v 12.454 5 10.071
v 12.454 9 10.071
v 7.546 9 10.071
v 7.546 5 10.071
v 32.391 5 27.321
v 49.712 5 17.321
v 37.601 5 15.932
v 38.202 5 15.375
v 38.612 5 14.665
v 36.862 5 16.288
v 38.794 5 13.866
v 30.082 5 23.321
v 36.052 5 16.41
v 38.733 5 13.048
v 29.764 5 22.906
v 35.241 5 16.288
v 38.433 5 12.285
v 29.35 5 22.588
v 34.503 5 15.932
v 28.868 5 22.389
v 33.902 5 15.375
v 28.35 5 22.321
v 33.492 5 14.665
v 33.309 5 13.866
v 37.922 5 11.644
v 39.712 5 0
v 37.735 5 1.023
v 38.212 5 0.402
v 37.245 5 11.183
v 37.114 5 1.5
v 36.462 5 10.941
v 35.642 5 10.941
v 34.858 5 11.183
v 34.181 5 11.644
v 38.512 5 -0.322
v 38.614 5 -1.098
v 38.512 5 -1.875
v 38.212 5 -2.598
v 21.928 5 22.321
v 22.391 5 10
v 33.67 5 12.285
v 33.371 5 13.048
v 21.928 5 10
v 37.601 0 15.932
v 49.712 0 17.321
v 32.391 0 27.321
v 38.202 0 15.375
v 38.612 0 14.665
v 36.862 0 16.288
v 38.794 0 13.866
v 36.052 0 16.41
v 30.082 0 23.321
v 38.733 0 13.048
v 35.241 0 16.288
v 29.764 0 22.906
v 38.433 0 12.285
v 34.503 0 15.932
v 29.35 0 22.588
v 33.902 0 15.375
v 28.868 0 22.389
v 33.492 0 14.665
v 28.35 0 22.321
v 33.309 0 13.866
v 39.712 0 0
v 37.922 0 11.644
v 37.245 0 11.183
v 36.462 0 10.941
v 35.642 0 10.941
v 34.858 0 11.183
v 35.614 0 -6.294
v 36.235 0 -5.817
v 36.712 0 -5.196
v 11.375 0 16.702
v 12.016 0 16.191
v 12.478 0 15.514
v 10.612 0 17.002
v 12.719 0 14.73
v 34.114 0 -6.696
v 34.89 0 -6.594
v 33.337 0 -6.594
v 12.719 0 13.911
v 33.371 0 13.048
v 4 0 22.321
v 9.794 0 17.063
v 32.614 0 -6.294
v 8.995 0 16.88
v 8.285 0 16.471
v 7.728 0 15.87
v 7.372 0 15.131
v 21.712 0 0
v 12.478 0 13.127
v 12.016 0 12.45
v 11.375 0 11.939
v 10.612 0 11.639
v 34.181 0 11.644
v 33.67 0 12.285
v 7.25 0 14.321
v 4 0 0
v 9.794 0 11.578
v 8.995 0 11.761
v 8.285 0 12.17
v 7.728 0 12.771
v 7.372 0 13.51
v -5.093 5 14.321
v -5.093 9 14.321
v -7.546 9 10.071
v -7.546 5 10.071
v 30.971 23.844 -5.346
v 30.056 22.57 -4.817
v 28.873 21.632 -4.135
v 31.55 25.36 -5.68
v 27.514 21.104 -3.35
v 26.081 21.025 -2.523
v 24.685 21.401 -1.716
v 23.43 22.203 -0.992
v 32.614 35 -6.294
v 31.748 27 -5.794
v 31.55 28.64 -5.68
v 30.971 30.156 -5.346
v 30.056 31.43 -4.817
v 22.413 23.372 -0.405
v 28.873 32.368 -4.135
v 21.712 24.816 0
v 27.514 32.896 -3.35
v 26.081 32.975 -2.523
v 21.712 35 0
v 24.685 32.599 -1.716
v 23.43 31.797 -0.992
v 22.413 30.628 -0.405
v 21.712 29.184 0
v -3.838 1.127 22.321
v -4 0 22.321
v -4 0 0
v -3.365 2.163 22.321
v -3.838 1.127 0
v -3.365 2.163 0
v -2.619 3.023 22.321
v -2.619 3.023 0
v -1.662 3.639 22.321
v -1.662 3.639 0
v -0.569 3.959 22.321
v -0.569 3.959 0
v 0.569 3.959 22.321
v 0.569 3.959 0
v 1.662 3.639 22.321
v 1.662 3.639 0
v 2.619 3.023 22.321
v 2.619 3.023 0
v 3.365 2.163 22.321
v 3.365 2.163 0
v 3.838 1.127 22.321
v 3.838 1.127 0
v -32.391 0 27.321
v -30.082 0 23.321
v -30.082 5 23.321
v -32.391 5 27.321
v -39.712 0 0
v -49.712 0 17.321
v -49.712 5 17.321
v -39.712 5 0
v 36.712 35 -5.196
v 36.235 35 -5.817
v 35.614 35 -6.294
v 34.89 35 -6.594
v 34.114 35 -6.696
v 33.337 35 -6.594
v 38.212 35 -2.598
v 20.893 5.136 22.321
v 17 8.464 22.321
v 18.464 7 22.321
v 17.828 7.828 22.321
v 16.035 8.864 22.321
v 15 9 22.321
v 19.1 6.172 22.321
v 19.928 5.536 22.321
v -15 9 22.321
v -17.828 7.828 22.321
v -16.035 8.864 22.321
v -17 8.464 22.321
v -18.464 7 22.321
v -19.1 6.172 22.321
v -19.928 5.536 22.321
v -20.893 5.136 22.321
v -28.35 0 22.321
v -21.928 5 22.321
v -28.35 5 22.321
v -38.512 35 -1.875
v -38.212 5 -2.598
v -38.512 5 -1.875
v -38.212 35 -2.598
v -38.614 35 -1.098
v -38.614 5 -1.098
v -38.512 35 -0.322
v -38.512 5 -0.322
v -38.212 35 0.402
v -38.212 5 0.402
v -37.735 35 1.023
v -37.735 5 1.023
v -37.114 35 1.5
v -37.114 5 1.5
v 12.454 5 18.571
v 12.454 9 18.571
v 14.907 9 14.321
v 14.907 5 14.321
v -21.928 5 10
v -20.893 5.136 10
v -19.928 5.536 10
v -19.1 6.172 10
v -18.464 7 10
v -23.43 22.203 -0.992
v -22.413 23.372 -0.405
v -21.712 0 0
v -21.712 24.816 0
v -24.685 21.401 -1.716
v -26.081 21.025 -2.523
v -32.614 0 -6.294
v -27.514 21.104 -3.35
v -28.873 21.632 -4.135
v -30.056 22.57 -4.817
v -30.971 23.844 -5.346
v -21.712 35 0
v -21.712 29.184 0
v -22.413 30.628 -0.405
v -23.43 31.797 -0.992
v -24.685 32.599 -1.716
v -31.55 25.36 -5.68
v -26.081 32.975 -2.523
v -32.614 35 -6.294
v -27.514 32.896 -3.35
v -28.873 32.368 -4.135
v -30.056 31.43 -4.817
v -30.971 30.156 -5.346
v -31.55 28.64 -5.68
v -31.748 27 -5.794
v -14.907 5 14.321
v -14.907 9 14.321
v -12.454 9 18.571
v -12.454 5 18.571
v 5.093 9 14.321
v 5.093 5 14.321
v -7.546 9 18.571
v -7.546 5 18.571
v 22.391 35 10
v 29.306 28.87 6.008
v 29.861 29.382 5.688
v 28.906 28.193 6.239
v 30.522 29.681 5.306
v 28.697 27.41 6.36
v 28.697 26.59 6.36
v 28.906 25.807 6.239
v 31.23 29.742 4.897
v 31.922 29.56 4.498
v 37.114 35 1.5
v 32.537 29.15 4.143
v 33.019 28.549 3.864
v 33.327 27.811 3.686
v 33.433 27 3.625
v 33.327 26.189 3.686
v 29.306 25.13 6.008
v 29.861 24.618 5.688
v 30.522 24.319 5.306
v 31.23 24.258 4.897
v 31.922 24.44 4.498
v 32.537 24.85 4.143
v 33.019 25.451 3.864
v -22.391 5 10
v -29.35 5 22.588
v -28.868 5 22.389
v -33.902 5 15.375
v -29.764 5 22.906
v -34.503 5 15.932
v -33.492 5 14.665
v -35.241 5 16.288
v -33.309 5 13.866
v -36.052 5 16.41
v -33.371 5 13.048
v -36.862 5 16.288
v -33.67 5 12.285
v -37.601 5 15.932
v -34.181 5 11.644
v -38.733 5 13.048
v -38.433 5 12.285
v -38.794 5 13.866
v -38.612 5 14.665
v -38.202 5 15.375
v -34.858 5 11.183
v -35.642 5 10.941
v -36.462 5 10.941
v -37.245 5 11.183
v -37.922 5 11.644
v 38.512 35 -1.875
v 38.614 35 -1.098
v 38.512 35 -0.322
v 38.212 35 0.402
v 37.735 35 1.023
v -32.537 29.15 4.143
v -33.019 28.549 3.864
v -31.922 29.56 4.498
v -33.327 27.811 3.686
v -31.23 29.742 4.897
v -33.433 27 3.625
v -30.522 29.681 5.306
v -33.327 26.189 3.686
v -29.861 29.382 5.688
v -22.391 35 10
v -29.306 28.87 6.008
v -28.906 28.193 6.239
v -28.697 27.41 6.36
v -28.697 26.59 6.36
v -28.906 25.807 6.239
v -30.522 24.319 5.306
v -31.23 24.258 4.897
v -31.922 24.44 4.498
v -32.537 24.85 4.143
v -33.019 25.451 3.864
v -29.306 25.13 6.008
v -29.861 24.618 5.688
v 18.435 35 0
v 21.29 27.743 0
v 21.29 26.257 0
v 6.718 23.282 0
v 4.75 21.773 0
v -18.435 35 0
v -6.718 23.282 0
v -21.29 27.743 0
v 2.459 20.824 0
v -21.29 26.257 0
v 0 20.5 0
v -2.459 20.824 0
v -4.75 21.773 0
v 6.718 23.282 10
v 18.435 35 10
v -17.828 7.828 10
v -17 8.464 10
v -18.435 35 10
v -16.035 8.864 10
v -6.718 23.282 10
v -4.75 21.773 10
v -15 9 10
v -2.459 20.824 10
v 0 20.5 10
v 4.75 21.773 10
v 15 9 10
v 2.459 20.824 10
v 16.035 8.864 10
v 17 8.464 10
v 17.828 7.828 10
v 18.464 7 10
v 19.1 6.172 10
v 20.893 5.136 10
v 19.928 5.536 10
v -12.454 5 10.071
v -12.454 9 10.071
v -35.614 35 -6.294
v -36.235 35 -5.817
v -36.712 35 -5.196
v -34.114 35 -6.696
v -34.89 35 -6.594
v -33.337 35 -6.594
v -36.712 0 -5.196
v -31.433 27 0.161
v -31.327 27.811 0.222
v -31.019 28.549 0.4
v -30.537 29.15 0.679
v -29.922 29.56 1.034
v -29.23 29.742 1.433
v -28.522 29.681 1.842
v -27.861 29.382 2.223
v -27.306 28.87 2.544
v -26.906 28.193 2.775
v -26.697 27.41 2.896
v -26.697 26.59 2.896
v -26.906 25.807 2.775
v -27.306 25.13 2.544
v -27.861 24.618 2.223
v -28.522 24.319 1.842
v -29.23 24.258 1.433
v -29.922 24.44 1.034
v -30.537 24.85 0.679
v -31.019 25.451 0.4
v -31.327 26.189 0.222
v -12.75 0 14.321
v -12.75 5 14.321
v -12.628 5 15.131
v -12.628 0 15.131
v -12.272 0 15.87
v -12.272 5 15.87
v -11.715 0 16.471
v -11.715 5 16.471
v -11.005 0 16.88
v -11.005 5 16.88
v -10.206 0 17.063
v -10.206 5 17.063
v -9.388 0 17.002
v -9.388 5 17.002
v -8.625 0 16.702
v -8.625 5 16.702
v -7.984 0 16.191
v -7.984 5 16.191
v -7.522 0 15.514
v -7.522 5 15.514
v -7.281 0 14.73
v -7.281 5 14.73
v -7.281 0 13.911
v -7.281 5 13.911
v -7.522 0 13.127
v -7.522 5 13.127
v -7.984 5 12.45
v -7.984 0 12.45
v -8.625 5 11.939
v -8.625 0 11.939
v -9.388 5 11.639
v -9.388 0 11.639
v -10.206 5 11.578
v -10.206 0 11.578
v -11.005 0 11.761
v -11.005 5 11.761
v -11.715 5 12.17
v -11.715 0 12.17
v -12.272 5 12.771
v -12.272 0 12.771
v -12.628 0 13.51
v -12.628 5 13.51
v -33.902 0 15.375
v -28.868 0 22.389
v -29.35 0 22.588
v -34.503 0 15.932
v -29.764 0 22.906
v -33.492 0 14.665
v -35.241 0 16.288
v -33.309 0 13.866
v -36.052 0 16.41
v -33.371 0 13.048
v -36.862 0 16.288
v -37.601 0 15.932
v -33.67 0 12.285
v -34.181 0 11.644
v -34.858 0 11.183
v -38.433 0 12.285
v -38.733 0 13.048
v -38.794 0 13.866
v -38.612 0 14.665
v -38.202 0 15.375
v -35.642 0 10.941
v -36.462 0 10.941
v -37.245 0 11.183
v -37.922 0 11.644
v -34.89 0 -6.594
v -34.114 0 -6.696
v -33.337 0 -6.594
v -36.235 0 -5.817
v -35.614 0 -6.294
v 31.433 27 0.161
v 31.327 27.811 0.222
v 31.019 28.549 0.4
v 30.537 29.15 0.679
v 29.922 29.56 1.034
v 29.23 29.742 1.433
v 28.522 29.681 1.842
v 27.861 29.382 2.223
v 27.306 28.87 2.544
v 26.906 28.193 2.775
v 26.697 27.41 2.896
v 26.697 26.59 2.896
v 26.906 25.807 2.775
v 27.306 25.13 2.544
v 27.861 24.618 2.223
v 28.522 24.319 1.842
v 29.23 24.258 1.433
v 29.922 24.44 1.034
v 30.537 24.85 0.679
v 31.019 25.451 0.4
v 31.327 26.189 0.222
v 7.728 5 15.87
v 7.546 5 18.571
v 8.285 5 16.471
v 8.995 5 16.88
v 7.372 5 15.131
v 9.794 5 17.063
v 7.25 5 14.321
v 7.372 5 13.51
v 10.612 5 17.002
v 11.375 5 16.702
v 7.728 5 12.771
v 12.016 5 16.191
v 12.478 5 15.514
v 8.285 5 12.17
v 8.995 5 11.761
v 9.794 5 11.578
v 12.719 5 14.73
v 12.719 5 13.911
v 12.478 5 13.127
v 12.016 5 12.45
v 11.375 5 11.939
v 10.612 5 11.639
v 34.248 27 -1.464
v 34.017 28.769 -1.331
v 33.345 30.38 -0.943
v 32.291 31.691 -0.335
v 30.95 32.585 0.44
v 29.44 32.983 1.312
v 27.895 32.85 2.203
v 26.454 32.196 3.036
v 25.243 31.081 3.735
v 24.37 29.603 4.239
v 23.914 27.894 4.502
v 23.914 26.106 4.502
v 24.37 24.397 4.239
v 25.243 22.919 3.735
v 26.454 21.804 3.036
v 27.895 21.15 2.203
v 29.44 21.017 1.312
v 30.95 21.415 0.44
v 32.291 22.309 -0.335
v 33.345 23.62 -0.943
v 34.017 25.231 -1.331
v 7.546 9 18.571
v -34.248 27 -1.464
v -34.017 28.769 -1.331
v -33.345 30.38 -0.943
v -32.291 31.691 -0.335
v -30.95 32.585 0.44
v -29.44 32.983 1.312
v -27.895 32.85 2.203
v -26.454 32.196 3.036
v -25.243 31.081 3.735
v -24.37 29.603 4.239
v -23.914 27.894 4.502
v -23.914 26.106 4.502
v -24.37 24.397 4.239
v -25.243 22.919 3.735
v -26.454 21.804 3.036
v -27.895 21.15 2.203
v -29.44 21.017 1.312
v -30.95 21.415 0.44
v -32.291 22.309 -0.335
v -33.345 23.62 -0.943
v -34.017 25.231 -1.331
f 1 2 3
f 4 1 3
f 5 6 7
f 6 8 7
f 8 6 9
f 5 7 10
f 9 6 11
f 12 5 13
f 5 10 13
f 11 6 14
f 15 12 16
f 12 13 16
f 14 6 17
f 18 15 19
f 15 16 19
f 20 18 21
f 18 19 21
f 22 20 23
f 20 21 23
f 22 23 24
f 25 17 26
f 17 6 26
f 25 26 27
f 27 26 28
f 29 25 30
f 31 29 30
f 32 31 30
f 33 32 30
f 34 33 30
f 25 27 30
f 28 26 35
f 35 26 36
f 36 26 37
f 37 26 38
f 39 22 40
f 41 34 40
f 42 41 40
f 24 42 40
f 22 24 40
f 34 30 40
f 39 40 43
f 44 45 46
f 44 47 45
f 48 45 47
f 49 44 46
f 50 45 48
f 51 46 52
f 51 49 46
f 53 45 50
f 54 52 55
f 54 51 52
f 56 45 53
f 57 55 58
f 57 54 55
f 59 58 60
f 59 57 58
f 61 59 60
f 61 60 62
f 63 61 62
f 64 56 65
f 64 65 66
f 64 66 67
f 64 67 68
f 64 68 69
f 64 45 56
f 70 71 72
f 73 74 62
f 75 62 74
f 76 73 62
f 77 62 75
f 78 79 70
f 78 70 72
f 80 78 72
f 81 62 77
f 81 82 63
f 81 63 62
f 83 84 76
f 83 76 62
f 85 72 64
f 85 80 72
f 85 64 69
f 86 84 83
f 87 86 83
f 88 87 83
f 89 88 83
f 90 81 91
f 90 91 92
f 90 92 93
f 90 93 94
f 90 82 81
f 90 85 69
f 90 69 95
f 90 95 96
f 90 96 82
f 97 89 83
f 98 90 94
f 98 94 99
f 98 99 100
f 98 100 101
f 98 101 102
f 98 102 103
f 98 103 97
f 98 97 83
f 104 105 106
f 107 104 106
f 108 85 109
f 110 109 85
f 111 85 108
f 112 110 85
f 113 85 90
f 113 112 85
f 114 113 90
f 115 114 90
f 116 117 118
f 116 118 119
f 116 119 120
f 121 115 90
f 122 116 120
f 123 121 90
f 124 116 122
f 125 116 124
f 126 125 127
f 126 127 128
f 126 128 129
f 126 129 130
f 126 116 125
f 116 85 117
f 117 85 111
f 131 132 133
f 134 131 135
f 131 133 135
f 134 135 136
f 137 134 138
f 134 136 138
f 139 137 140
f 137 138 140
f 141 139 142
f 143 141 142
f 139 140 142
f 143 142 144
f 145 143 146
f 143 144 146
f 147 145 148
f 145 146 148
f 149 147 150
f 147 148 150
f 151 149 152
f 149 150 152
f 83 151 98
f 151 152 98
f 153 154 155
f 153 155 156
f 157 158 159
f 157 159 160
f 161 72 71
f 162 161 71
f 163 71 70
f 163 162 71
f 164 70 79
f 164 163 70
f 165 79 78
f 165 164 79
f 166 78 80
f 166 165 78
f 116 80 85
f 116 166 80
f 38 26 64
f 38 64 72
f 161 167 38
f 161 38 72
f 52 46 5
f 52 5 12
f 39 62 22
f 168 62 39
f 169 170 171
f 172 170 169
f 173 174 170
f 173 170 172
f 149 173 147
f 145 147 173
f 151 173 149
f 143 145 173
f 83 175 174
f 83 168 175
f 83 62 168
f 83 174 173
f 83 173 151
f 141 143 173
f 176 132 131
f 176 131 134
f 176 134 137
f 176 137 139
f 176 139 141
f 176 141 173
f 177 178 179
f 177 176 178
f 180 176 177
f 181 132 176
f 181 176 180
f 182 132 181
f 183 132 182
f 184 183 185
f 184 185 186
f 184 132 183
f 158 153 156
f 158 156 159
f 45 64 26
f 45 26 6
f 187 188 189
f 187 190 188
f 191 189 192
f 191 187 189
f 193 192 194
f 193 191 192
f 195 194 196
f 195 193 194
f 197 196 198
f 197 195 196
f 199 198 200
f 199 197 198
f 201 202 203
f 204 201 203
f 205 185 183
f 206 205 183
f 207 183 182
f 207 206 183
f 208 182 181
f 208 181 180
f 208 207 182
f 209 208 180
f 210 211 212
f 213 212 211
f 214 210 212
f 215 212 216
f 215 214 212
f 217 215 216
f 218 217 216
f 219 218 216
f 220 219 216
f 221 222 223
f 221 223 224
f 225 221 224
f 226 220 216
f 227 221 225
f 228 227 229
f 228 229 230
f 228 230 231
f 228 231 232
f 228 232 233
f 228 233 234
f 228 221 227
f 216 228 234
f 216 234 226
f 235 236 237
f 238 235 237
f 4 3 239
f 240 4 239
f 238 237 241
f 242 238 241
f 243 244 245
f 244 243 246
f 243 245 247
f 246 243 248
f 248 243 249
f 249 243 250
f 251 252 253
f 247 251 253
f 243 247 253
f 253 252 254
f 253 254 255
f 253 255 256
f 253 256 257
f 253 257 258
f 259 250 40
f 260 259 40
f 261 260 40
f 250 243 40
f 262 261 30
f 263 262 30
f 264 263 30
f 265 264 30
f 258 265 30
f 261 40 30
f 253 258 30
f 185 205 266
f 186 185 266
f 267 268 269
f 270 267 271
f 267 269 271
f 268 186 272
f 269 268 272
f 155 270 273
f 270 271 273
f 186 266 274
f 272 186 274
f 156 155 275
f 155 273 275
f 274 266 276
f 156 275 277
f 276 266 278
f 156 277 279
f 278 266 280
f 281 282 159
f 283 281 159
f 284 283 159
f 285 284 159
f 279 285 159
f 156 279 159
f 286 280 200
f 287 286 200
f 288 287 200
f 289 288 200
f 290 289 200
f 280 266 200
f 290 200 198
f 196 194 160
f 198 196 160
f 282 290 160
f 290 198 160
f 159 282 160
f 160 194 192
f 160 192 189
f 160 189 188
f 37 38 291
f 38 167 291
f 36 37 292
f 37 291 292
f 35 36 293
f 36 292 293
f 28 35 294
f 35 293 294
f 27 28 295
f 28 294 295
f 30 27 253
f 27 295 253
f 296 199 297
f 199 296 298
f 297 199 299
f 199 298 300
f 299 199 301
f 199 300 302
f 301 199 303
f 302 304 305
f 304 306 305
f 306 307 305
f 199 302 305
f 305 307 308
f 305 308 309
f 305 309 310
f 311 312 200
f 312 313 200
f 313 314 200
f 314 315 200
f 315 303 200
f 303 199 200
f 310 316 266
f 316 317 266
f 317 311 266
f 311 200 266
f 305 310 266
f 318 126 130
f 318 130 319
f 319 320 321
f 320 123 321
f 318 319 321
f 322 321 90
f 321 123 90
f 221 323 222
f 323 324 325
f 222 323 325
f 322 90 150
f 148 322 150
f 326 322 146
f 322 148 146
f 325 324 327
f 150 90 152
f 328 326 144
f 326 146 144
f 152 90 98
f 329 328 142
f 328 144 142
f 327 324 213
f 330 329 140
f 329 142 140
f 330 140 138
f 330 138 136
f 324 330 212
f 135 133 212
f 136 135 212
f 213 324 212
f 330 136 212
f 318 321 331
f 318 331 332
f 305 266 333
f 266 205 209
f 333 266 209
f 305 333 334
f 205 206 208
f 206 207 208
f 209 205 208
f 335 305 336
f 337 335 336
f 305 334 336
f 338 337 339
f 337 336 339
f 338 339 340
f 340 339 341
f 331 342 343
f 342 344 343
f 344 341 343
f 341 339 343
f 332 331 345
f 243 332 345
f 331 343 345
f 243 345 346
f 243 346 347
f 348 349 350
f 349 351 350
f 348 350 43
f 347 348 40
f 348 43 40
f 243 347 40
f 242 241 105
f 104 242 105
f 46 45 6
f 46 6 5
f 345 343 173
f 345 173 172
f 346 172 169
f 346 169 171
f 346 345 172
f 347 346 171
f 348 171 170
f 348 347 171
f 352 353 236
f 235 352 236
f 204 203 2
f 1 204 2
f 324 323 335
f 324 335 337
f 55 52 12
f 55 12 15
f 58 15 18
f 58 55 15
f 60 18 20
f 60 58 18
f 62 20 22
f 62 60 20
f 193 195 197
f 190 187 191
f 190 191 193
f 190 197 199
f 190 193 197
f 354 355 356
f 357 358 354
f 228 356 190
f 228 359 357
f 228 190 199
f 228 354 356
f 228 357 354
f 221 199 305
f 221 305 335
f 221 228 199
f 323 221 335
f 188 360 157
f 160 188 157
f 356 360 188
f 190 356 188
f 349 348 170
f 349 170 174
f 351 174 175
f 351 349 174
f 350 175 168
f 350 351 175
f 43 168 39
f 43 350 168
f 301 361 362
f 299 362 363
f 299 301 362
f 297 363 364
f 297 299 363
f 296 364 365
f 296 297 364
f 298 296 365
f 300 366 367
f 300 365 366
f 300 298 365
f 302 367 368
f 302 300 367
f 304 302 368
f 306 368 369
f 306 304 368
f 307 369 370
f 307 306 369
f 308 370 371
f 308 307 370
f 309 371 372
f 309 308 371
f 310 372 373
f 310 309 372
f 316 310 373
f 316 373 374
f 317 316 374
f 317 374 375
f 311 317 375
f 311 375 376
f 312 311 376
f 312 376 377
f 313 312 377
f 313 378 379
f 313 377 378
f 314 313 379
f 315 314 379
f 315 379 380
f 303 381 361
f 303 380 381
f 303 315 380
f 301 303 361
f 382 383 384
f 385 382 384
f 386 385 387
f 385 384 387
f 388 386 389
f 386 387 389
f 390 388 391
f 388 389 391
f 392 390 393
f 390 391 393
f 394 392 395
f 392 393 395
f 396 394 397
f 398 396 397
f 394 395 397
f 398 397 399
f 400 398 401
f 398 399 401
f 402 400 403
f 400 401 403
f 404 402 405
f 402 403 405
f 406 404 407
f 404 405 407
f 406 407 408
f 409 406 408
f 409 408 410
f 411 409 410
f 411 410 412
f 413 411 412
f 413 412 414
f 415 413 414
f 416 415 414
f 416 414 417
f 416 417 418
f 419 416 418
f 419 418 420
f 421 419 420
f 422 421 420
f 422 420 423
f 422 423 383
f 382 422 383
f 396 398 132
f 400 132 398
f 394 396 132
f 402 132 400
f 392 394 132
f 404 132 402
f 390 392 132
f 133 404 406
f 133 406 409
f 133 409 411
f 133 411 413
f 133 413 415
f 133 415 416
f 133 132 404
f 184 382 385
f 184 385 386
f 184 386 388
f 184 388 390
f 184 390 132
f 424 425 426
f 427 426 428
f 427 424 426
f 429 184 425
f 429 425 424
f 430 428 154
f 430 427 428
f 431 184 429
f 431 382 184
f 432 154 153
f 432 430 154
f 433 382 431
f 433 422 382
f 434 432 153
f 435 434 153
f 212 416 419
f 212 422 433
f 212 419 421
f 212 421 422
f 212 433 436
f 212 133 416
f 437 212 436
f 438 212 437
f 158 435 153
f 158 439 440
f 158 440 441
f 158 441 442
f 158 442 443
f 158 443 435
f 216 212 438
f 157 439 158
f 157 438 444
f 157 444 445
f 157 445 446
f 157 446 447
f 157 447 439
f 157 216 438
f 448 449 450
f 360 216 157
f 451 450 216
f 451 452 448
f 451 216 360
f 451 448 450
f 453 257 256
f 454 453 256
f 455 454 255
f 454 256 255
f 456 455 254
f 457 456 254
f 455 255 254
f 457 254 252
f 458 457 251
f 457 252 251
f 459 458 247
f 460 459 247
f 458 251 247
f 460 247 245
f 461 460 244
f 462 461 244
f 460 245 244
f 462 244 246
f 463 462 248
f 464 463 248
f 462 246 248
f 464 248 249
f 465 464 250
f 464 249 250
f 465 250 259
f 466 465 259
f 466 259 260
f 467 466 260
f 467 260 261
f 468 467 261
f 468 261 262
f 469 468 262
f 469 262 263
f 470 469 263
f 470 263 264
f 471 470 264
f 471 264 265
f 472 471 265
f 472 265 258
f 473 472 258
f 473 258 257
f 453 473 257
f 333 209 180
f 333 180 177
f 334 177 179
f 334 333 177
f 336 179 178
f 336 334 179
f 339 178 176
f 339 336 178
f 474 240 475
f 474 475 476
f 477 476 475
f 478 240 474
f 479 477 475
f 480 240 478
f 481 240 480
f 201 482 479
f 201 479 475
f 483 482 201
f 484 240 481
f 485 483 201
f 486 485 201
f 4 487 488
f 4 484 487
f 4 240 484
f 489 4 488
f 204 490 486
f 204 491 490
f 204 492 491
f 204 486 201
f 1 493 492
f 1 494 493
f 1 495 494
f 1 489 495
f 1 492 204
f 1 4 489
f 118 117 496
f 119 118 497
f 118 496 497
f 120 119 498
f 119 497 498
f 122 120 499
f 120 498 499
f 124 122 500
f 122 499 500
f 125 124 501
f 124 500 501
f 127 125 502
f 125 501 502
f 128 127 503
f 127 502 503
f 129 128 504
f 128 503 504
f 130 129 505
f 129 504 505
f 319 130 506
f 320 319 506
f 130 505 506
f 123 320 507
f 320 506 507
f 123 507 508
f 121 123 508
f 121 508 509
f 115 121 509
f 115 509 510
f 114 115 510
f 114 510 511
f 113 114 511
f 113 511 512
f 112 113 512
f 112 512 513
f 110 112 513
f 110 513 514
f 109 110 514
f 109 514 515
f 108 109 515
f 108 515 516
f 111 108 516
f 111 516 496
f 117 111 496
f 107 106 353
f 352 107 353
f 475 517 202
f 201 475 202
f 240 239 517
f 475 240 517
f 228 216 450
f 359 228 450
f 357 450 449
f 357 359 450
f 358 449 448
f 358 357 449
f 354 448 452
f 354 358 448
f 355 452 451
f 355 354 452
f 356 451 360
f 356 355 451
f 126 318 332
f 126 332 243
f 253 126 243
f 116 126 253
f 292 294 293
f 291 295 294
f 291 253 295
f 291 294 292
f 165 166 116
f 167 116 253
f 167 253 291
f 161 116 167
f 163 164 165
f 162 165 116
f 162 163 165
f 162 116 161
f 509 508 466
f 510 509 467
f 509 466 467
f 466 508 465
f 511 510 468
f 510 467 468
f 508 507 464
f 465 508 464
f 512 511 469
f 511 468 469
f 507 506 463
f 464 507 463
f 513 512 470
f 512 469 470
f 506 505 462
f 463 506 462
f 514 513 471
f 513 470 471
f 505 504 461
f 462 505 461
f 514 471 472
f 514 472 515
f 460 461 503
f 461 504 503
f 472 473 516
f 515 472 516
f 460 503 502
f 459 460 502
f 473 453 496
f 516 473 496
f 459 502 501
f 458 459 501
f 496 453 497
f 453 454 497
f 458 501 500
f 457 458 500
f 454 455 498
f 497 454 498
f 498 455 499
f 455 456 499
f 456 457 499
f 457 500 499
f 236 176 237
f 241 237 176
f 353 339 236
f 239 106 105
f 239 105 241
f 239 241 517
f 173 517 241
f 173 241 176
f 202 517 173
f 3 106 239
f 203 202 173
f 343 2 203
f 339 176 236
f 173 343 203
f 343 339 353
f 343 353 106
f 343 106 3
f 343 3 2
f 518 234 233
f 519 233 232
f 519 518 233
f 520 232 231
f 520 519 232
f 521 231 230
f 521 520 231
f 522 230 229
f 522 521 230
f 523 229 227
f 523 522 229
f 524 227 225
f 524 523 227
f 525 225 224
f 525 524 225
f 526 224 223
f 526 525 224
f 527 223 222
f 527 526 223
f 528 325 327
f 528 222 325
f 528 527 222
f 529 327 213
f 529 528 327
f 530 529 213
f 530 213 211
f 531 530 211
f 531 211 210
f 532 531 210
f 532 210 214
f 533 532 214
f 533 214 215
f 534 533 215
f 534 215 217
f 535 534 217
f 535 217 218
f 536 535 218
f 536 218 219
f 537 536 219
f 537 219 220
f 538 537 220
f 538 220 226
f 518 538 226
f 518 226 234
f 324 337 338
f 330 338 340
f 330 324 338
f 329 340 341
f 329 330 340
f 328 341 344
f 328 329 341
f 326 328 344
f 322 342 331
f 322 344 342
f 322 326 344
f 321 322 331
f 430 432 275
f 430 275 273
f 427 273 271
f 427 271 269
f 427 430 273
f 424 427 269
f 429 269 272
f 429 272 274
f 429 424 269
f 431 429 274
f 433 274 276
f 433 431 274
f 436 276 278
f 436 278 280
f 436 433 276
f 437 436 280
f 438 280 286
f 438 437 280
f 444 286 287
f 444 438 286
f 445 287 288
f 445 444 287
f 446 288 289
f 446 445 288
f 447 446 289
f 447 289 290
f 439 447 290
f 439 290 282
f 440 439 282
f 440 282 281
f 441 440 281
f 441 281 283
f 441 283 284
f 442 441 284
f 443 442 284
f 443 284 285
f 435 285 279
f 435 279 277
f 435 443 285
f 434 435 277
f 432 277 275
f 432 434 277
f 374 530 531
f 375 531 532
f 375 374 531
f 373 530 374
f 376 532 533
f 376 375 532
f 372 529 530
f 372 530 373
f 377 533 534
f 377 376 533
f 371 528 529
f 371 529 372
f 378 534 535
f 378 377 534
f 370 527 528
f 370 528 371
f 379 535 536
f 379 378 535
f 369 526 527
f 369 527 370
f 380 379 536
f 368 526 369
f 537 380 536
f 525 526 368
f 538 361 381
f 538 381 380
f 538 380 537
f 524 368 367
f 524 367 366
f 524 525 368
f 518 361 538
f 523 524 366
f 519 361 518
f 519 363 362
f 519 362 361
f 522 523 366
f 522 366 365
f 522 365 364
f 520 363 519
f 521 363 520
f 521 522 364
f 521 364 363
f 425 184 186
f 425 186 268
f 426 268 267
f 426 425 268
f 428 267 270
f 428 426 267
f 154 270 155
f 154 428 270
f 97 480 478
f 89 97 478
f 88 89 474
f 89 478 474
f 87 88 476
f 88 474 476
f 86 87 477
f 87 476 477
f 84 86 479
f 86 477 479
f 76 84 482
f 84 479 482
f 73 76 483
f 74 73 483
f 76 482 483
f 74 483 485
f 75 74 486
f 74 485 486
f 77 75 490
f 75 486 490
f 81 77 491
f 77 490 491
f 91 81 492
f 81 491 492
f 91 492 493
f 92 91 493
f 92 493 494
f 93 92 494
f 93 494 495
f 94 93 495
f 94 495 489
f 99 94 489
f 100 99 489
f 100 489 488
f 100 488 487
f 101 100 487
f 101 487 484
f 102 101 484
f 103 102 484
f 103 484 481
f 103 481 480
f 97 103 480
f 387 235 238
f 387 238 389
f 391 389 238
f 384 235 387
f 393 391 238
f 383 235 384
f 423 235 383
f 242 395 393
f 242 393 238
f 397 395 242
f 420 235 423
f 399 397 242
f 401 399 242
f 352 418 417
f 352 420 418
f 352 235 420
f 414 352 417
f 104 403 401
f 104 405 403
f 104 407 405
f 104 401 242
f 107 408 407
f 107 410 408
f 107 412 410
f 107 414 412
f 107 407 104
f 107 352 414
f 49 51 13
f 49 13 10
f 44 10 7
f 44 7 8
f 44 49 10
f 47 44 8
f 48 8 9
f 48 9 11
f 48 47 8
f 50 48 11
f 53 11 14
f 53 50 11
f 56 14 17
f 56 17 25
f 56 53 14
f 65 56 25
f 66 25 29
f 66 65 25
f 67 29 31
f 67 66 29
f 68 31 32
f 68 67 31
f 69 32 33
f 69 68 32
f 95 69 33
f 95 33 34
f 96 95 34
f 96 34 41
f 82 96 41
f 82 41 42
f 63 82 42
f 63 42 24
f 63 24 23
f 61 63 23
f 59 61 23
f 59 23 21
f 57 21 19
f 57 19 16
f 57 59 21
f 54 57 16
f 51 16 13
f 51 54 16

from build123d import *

# Parameters (mm, degrees)
SKETCH1_R                = 2.75
BOSS_EXTRUDE1_DEPTH      = 5
BOSS_EXTRUDE2_DEPTH      = 30
BOSS_EXTRUDE2_DEPTH_BACK = 5
BOSS_EXTRUDE3_DEPTH      = 12.320508
SKETCH5_R                = 4
CUT_EXTRUDE1_DEPTH       = 28.320508076
SKETCH7_R                = 2.75
CUT_EXTRUDE3_DEPTH       = 51.510942144
CUT_EXTRUDE4_START       = -4
SKETCH8_R                = 6
CUT_EXTRUDE4_DEPTH       = 47.510942144
SKETCH9_R                = 2.75
CUT_EXTRUDE5_DEPTH       = 10
CUT_EXTRUDE6_DEPTH       = 4
FILLET2_R                = 3


with BuildPart() as part:
    # Sketch1 → Boss-Extrude1 (new body)
    with BuildSketch(Plane(origin=(0, 0, 0), x_dir=(1, 0, 0), z_dir=(0, 1, 0))):
        with BuildLine():
            Line((-39.711904038, 0), (39.711904038, 0))
            Line((39.711904038, 0), (49.711904038, -17.320508076))
            Line((49.711904038, -17.320508076), (32.391395962, -27.320508076))
            Line((32.391395962, -27.320508076), (30.081994885, -23.320508076))
            ThreePointArc((30.081994885, -23.320508076), (29.349944078, -22.588457268), (28.349944078, -22.320508076))
            Line((28.349944078, -22.320508076), (-28.349944078, -22.320508076))
            ThreePointArc((-28.349944078, -22.320508076), (-29.349944078, -22.588457268), (-30.081994885, -23.320508076))
            Line((-30.081994885, -23.320508076), (-32.391395962, -27.320508076))
            Line((-32.391395962, -27.320508076), (-49.711904038, -17.320508076))
            Line((-49.711904038, -17.320508076), (-39.711904038, 0))
        make_face()
        with Locations(Location((-36.05165, -13.660254038, 0), (0, 0, 270))):  # turned: the seam where the file's is
            Circle(SKETCH1_R, mode=Mode.SUBTRACT)
        with Locations(Location((36.05165, -13.660254038, 0), (0, 0, 270))):  # turned: the seam where the file's is
            Circle(SKETCH1_R, mode=Mode.SUBTRACT)
    extrude(amount=BOSS_EXTRUDE1_DEPTH)

    # Sketch2 → Boss-Extrude2 (add, two sides)
    with BuildSketch(Plane(origin=(0, 5, 0), x_dir=(1, 0, 0), z_dir=(0, 1, 0))) as boss_extrude2_sk:
        with BuildLine():
            Line((-39.711904038, 0), (-22.391395962, -10))
            Line((-22.391395962, -10), (22.391395962, -10))
            Line((22.391395962, -10), (39.711904038, 0))
            Line((39.711904038, 0), (36.711904038, 5.196152423))
            ThreePointArc((36.711904038, 5.196152423), (34.890284962, 6.593929902), (32.613827826, 6.294228634))
            Line((32.613827826, 6.294228634), (21.711904038, 0))
            Line((21.711904038, 0), (-21.711904038, 0))
            Line((-21.711904038, 0), (-32.613827826, 6.294228634))
            ThreePointArc((-32.613827826, 6.294228634), (-34.890284962, 6.593929902), (-36.711904038, 5.196152423))
            Line((-36.711904038, 5.196152423), (-39.711904038, 0))
        make_face()
    extrude(amount=BOSS_EXTRUDE2_DEPTH)
    extrude(boss_extrude2_sk.sketch, amount=-BOSS_EXTRUDE2_DEPTH_BACK)

    # Sketch4 → Boss-Extrude3 (add)
    with BuildSketch(Plane.XY.offset(10)):
        with BuildLine():
            Line((-15, 9), (15, 9))
            ThreePointArc((15, 9), (17, 8.464101615), (18.464101615, 7))
            ThreePointArc((18.464101615, 7), (19.92820323, 5.535898385), (21.92820323, 5))
            Line((21.92820323, 5), (-21.92820323, 5))
            ThreePointArc((-21.92820323, 5), (-19.92820323, 5.535898385), (-18.464101615, 7))
            ThreePointArc((-18.464101615, 7), (-17, 8.464101615), (-15, 9))
        make_face()
    extrude(amount=BOSS_EXTRUDE3_DEPTH)

    # Sketch5 → Cut-Extrude1 (cut, through all)
    with BuildSketch(Plane(origin=(0, 0, 0), x_dir=(-1, 0, 0), z_dir=(0, 0, -1))):
        Circle(SKETCH5_R)
        with BuildLine():
            Line((-6.717514421, 23.282485579), (-18.435028843, 35))
            Line((-18.435028843, 35), (18.435028843, 35))
            Line((18.435028843, 35), (6.717514421, 23.282485579))
            ThreePointArc((6.717514421, 23.282485579), (0, 20.5), (-6.717514421, 23.282485579))
        make_face()
    extrude(amount=-CUT_EXTRUDE1_DEPTH, mode=Mode.SUBTRACT)

    # Sketch7 → Cut-Extrude3 (cut, through all)
    with BuildSketch(Plane(origin=(9.927976009, 0, 17.195758865), x_dir=(0.866025404, 0, -0.5), z_dir=(0.5, 0, 0.866025404))):
        with Locations((24.391517729, 27)):
            Circle(SKETCH7_R)
    cut_extrude3 = extrude(amount=-CUT_EXTRUDE3_DEPTH, mode=Mode.SUBTRACT)

    # Sketch8 → Cut-Extrude4 (cut, through all)
    with BuildSketch(Plane(origin=(9.927976009, 0, 17.195758865), x_dir=(0.866025404, 0, -0.5), z_dir=(0.5, 0, 0.866025404)).offset(CUT_EXTRUDE4_START)):
        with Locations((24.391517729, 27)):
            Circle(SKETCH8_R)
    cut_extrude4 = extrude(amount=-CUT_EXTRUDE4_DEPTH, mode=Mode.SUBTRACT)

    # Mirror1: Cut-Extrude3, Cut-Extrude4 across plane
    add(cut_extrude3.mirror(Plane(origin=(0, 0, 0), x_dir=(0, 0, 1), z_dir=(1, 0, 0))), mode=Mode.SUBTRACT)
    add(cut_extrude4.mirror(Plane(origin=(0, 0, 0), x_dir=(0, 0, 1), z_dir=(1, 0, 0))), mode=Mode.SUBTRACT)

    # Sketch9 → Cut-Extrude5 (cut, through all)
    with BuildSketch(Plane(origin=(0, 9, 0), x_dir=(1, 0, 0), z_dir=(0, 1, 0))):
        with Locations(Location((-10, -14.32050808, 0), (0, 0, 180))):  # turned: the seam where the file's is
            Circle(SKETCH9_R)
        with Locations(Location((10, -14.32050808, 0), (0, 0, 180))):  # turned: the seam where the file's is
            Circle(SKETCH9_R)
    extrude(amount=-CUT_EXTRUDE5_DEPTH, mode=Mode.SUBTRACT)

    # Sketch10 → Cut-Extrude6 (cut)
    with BuildSketch(Plane(origin=(0, 9, 0), x_dir=(1, 0, 0), z_dir=(0, 1, 0))):
        Polygon((-5.092522712, -14.32050808), (-7.546261356, -10.07050808), (-12.453738644, -10.07050808), (-14.907477288, -14.32050808), (-12.453738644, -18.57050808), (-7.546261356, -18.57050808), align=None)
        Polygon((5.092522712, -14.32050808), (7.546261356, -18.57050808), (12.453738644, -18.57050808), (14.907477288, -14.32050808), (12.453738644, -10.07050808), (7.546261356, -10.07050808), align=None)
    extrude(amount=-CUT_EXTRUDE6_DEPTH, mode=Mode.SUBTRACT)

    # Fillet2
    fillet2_edges = [part.edges().sort_by_distance(p)[0] for p in [
        (39.711904038, 20, 0),
        (-39.711904038, 20, 0),
    ]]
    fillet(fillet2_edges, radius=FILLET2_R)


solid = part.part
